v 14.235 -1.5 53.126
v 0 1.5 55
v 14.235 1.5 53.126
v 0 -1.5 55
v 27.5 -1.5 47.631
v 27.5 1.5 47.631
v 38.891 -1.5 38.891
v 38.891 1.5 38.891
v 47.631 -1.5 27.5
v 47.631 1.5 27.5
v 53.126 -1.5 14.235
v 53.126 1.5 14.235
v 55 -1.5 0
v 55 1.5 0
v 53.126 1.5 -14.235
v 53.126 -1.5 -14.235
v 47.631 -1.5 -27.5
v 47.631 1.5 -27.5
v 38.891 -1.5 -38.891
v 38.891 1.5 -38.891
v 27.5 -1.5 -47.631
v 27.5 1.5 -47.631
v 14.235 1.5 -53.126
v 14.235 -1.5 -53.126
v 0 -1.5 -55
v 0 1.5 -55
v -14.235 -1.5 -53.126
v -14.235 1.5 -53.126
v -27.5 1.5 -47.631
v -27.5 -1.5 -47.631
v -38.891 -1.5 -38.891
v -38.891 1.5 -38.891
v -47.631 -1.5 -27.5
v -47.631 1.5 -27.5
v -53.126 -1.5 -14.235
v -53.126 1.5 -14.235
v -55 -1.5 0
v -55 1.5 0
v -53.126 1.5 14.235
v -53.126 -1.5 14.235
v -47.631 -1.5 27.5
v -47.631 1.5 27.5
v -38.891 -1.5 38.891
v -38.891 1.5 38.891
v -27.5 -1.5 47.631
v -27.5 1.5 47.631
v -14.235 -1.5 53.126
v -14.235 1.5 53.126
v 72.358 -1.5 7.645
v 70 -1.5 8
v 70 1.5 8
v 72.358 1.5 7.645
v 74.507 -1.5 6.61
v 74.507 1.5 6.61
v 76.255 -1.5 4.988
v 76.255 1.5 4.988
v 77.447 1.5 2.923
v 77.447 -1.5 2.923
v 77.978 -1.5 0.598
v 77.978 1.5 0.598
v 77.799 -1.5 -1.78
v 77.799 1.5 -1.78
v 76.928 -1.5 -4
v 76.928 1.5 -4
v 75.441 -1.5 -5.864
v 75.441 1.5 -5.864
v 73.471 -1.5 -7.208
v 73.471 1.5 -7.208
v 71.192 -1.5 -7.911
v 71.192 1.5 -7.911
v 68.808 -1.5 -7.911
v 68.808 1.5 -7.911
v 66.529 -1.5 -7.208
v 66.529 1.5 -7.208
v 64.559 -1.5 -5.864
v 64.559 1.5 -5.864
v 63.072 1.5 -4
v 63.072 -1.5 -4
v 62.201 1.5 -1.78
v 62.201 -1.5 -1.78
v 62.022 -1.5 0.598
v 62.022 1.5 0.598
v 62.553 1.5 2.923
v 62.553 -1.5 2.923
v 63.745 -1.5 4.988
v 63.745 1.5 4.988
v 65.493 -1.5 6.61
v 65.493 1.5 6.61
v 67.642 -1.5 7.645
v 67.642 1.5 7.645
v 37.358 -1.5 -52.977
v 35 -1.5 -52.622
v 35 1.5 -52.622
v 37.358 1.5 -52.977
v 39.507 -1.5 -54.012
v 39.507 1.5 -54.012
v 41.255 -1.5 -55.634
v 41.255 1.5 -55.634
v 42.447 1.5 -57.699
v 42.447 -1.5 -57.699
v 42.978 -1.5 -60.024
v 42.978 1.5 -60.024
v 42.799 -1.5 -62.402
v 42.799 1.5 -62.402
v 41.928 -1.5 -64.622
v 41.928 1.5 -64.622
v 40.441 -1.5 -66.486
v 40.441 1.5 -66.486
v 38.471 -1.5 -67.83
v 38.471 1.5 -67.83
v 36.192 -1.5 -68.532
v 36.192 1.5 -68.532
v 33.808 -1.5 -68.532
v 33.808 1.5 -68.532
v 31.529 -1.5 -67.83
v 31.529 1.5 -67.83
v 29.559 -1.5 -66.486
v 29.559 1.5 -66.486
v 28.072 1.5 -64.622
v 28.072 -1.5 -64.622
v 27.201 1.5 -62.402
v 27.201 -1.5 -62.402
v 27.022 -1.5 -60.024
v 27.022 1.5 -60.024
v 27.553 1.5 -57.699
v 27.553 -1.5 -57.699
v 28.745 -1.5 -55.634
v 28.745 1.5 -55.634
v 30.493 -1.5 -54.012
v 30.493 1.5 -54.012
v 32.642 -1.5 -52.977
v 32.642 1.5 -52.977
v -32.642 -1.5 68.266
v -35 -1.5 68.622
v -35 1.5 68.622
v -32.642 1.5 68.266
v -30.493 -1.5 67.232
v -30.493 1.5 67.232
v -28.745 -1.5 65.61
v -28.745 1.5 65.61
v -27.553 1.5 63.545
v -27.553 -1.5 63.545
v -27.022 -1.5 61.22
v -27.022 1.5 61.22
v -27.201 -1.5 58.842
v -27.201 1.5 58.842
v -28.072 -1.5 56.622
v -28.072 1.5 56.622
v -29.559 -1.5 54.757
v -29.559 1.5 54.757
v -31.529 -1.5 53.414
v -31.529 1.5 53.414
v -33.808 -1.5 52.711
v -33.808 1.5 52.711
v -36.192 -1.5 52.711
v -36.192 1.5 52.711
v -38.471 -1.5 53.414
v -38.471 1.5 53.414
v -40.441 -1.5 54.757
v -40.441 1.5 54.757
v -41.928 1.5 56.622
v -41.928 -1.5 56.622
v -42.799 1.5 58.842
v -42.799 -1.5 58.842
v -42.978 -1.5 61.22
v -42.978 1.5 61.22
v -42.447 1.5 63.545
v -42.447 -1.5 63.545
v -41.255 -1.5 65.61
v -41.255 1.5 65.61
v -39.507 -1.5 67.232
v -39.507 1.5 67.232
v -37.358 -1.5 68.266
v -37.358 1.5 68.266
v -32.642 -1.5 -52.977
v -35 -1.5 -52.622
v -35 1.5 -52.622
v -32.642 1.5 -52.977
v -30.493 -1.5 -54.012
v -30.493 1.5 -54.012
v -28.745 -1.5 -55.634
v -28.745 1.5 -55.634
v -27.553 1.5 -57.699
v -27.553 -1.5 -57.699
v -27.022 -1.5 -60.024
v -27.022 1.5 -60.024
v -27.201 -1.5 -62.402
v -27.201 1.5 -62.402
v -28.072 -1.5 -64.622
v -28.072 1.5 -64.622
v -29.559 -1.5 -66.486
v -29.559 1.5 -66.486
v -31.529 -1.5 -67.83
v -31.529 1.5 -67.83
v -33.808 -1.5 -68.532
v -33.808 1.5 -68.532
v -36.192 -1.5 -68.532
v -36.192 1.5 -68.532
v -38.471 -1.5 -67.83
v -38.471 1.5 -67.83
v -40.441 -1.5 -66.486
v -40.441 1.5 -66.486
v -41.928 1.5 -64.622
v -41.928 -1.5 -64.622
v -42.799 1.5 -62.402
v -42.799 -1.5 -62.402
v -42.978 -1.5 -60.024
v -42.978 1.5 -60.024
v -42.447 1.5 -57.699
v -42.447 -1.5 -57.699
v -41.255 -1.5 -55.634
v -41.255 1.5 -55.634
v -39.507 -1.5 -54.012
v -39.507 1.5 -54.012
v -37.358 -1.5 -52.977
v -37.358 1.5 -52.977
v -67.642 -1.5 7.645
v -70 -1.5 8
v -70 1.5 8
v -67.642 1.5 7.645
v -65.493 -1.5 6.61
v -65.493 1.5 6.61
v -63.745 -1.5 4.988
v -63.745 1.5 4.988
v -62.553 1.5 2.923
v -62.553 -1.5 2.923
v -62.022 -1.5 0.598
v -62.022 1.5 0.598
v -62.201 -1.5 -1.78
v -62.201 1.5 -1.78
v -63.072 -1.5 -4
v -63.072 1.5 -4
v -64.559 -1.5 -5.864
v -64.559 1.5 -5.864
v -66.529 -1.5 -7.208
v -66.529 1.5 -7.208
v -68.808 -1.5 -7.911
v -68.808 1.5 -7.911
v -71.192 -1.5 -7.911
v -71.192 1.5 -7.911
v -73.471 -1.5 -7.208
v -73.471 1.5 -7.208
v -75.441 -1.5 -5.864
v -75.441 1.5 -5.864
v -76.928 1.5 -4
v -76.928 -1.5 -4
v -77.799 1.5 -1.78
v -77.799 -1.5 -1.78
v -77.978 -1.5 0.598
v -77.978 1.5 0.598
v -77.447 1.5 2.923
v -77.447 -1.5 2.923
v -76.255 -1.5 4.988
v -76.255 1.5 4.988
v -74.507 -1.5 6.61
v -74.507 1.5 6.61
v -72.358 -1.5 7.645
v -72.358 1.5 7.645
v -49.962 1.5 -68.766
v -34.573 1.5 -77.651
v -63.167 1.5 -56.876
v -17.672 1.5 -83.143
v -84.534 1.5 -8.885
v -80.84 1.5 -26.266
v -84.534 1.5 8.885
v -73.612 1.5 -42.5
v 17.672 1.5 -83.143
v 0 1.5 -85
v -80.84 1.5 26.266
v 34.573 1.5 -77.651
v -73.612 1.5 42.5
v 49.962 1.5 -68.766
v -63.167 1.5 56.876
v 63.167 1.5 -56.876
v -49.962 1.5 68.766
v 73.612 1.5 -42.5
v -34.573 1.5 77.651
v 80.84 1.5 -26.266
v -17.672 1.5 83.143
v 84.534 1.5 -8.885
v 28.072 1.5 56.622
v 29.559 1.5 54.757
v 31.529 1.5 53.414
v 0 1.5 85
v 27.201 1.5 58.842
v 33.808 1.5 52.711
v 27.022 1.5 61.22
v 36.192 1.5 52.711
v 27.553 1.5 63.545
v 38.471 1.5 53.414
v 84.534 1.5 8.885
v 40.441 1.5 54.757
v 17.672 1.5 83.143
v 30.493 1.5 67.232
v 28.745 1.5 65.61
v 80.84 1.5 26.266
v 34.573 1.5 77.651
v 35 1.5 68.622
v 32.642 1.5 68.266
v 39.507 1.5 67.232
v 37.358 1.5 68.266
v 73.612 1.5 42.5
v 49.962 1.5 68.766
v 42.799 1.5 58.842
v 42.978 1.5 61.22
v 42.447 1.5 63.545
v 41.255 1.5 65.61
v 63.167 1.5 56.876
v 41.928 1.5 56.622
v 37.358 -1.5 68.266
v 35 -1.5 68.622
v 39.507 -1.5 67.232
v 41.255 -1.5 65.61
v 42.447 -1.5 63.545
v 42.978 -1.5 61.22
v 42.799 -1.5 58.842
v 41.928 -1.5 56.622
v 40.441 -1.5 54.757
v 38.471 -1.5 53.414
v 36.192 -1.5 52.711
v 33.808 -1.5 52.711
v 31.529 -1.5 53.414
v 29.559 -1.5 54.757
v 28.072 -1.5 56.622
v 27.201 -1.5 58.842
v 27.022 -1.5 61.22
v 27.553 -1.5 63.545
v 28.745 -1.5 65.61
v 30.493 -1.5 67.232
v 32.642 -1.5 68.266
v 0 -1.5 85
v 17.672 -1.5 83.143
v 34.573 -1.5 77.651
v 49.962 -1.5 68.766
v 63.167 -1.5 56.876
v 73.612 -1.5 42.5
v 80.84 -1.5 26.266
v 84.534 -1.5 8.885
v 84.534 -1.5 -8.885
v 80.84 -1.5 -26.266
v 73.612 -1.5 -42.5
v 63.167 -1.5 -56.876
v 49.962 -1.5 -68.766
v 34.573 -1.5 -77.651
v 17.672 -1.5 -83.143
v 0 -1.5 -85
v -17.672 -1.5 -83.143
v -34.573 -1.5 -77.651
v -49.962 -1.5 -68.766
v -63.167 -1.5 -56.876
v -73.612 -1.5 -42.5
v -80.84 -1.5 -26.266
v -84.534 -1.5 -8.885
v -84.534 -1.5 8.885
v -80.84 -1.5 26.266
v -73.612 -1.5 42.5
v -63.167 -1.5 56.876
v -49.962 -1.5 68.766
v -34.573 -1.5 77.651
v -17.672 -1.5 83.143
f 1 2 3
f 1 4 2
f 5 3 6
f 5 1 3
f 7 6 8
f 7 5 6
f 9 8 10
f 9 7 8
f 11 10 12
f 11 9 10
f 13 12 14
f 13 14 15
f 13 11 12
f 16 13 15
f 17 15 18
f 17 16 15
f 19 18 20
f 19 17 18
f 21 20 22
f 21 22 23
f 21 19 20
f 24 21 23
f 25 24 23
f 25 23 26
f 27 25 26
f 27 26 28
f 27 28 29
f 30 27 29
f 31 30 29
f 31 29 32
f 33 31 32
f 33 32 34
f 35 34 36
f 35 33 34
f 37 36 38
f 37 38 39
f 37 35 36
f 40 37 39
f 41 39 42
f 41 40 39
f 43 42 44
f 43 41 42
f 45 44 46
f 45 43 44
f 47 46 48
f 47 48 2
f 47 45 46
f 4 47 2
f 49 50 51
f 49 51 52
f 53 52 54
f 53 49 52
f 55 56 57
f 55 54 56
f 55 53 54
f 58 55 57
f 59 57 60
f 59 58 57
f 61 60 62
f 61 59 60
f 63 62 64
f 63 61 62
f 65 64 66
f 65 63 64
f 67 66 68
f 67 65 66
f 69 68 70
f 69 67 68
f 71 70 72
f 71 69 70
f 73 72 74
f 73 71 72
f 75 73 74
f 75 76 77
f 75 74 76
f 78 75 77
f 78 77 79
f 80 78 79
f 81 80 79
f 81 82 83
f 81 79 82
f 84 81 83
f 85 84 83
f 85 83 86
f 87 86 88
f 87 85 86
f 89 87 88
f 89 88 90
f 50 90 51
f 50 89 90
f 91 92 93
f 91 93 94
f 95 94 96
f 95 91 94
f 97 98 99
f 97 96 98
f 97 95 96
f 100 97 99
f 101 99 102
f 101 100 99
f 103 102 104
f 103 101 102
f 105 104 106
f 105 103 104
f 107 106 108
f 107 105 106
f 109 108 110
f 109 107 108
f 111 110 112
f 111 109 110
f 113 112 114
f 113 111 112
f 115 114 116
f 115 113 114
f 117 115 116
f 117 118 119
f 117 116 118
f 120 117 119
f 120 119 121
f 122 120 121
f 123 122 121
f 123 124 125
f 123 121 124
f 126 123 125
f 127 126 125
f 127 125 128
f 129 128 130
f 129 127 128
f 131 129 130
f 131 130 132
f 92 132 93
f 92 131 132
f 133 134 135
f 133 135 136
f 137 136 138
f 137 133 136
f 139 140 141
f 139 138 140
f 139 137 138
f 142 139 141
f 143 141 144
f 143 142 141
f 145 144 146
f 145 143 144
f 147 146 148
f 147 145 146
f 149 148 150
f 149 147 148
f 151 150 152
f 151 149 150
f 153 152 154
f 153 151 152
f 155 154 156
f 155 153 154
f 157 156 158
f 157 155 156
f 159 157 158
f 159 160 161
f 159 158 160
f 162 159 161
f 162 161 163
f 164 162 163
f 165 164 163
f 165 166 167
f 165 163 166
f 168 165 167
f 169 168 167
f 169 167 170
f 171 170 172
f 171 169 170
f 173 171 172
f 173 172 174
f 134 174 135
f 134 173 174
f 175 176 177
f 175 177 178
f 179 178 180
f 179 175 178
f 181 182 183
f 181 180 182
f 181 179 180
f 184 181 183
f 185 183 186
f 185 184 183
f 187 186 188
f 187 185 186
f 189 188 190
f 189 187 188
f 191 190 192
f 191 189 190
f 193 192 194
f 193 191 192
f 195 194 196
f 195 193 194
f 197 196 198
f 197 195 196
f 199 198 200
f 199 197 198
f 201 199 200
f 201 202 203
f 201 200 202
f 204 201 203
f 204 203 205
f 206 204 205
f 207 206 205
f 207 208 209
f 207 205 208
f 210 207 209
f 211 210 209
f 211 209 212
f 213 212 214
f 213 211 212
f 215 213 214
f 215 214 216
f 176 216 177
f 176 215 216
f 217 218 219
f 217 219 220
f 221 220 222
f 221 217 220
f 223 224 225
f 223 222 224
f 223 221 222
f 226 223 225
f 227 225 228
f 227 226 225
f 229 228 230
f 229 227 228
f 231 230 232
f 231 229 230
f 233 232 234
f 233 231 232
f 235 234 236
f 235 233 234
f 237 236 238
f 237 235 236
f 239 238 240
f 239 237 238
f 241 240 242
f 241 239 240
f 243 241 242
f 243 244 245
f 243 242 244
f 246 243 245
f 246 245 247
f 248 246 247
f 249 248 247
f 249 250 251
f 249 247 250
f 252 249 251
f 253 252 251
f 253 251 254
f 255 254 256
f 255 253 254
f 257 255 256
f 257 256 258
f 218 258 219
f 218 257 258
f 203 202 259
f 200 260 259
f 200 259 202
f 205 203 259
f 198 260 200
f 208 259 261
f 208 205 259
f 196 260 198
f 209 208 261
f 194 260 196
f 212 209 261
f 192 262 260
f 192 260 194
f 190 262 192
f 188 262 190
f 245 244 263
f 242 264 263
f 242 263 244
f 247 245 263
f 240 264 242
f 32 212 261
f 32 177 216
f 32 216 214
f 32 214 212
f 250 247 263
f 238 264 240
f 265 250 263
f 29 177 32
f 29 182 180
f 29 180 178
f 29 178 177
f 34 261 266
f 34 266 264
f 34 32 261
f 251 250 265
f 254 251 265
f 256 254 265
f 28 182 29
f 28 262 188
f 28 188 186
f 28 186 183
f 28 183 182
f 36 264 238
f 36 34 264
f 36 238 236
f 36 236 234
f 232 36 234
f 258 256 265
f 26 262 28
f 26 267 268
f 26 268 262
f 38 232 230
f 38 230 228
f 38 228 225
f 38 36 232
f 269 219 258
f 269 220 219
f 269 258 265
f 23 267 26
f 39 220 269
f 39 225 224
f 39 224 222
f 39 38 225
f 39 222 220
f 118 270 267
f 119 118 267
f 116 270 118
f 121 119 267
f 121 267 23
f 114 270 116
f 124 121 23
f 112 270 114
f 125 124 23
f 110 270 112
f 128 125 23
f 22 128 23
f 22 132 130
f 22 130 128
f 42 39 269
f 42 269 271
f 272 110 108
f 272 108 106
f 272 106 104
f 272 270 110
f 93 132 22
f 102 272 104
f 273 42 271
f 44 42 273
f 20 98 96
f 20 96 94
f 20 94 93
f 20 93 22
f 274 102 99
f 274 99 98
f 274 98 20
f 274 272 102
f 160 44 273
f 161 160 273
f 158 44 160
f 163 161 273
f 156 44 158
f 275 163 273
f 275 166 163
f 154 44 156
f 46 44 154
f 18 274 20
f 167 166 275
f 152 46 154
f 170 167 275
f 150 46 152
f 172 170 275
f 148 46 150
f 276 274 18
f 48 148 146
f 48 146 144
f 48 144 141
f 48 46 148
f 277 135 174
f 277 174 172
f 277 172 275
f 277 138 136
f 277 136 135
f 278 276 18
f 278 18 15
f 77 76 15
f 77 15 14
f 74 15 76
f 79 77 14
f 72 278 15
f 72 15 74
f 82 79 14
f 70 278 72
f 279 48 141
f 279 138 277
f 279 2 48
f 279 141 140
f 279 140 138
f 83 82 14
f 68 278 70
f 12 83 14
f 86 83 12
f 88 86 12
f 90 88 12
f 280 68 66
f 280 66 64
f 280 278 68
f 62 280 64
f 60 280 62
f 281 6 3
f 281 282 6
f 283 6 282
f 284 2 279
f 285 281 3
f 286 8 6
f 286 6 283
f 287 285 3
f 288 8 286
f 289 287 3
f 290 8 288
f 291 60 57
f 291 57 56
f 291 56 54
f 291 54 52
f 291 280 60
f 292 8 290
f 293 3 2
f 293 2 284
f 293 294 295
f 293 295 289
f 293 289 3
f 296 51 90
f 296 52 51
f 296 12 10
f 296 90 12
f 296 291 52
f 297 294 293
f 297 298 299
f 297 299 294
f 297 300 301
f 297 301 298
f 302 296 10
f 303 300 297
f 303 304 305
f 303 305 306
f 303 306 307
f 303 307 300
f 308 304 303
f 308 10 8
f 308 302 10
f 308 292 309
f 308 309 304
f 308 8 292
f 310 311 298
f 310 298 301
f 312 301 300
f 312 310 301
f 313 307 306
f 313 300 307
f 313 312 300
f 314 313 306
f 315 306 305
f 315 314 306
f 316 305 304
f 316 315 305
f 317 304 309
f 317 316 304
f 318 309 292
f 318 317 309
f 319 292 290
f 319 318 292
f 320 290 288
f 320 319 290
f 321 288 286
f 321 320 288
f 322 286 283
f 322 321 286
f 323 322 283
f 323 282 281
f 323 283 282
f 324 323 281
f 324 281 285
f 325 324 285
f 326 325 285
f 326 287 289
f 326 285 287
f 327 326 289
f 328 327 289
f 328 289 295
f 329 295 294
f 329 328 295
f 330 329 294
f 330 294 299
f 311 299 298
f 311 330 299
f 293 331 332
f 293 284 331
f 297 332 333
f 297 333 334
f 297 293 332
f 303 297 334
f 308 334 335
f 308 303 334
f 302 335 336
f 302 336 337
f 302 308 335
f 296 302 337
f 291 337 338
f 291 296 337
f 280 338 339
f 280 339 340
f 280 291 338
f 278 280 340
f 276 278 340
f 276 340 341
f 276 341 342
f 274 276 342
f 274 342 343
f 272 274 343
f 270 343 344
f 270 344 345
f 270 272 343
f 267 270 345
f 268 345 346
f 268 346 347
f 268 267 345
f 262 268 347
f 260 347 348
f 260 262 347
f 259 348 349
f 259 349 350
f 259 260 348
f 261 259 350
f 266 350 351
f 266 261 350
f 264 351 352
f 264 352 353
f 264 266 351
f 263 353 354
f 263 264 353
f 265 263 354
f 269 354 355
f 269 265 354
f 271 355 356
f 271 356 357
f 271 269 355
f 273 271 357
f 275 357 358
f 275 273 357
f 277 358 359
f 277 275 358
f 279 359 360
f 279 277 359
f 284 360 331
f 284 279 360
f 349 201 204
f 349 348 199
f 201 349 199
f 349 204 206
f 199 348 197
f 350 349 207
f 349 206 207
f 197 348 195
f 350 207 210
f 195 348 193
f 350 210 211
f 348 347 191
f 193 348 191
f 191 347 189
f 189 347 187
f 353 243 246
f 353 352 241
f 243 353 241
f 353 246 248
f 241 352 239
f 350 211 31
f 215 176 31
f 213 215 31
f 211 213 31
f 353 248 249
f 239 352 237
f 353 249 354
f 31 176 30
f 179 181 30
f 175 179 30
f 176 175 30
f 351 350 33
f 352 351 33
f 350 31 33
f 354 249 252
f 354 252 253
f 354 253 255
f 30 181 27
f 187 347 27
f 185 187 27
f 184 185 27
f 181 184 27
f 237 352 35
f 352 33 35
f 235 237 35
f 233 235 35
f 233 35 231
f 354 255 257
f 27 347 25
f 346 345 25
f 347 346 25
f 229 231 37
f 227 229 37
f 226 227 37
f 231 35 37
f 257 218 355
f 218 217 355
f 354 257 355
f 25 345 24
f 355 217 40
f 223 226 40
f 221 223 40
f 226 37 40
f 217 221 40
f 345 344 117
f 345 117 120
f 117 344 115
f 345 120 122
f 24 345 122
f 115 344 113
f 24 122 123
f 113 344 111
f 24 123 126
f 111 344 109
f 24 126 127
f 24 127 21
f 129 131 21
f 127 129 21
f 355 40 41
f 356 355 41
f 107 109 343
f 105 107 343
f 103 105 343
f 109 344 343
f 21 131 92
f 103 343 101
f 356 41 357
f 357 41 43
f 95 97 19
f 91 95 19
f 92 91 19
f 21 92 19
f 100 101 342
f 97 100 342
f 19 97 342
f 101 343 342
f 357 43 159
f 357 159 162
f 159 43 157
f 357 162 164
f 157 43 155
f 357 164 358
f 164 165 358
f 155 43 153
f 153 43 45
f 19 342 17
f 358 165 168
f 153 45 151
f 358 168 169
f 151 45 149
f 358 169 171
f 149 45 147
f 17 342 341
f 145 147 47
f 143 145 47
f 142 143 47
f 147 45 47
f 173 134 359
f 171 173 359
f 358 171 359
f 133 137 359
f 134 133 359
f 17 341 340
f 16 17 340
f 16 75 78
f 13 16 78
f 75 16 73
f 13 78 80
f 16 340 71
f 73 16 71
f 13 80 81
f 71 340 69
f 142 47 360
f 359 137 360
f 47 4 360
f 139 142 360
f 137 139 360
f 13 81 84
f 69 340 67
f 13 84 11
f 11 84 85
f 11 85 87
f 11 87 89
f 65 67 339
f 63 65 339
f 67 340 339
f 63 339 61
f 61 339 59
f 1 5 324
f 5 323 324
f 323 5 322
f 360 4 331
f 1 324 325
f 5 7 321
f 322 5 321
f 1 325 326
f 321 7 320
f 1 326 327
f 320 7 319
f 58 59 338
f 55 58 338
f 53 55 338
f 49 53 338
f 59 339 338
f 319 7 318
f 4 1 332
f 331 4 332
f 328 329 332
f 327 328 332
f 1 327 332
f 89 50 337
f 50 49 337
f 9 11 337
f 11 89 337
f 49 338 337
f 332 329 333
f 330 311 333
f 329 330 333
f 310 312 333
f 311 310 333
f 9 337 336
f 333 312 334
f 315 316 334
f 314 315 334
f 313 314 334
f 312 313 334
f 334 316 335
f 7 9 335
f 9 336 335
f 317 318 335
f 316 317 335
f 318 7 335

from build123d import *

# Parameters (mm, degrees)
SKETCH1_R               = 85
SKETCH1_R_2             = 55
BOSS_EXTRUDE1_DEPTH     = 1.5
CUT_EXTRUDE1_DEPTH      = 121.245582039
CUT_EXTRUDE1_DEPTH_BACK = 121.245582039
SKETCH2_R               = 8


with BuildPart() as part:
    # Sketch1 → Boss-Extrude1 (new, symmetric)
    with BuildSketch(Plane(origin=(0, 0, 0), x_dir=(1, 0, 0), z_dir=(0, 1, 0))):
        with Locations(Location((0, 0, 0), (0, 0, 270))):
            Circle(SKETCH1_R)
        with Locations(Location((0, 0, 0), (0, 0, 270))):
            Circle(SKETCH1_R_2, mode=Mode.SUBTRACT)
    extrude(amount=BOSS_EXTRUDE1_DEPTH, both=True)

    # Sketch2 → Cut-Extrude1 (cut, two sides: drawn at the far end of the back side and taken through both)
    with BuildSketch(Plane(origin=(0, 1.5, 0), x_dir=(1, 0, 0), z_dir=(0, 1, 0)).offset(-CUT_EXTRUDE1_DEPTH_BACK)):
        with Locations(Location((70, 0, 0), (0, 0, 270))):
            Circle(SKETCH2_R)
        with Locations(Location((35, -60.621778265, 0), (0, 0, 270))):
            Circle(SKETCH2_R)
        with Locations(Location((-35, -60.621778265, 0), (0, 0, 270))):
            Circle(SKETCH2_R)
        with Locations(Location((-70, 0, 0), (0, 0, 270))):
            Circle(SKETCH2_R)
        with Locations(Location((-35, 60.621778265, 0), (0, 0, 270))):
            Circle(SKETCH2_R)
        with Locations(Location((35, 60.621778265, 0), (0, 0, 270))):
            Circle(SKETCH2_R)
    extrude(amount=CUT_EXTRUDE1_DEPTH + CUT_EXTRUDE1_DEPTH_BACK, mode=Mode.SUBTRACT)


solid = part.part
